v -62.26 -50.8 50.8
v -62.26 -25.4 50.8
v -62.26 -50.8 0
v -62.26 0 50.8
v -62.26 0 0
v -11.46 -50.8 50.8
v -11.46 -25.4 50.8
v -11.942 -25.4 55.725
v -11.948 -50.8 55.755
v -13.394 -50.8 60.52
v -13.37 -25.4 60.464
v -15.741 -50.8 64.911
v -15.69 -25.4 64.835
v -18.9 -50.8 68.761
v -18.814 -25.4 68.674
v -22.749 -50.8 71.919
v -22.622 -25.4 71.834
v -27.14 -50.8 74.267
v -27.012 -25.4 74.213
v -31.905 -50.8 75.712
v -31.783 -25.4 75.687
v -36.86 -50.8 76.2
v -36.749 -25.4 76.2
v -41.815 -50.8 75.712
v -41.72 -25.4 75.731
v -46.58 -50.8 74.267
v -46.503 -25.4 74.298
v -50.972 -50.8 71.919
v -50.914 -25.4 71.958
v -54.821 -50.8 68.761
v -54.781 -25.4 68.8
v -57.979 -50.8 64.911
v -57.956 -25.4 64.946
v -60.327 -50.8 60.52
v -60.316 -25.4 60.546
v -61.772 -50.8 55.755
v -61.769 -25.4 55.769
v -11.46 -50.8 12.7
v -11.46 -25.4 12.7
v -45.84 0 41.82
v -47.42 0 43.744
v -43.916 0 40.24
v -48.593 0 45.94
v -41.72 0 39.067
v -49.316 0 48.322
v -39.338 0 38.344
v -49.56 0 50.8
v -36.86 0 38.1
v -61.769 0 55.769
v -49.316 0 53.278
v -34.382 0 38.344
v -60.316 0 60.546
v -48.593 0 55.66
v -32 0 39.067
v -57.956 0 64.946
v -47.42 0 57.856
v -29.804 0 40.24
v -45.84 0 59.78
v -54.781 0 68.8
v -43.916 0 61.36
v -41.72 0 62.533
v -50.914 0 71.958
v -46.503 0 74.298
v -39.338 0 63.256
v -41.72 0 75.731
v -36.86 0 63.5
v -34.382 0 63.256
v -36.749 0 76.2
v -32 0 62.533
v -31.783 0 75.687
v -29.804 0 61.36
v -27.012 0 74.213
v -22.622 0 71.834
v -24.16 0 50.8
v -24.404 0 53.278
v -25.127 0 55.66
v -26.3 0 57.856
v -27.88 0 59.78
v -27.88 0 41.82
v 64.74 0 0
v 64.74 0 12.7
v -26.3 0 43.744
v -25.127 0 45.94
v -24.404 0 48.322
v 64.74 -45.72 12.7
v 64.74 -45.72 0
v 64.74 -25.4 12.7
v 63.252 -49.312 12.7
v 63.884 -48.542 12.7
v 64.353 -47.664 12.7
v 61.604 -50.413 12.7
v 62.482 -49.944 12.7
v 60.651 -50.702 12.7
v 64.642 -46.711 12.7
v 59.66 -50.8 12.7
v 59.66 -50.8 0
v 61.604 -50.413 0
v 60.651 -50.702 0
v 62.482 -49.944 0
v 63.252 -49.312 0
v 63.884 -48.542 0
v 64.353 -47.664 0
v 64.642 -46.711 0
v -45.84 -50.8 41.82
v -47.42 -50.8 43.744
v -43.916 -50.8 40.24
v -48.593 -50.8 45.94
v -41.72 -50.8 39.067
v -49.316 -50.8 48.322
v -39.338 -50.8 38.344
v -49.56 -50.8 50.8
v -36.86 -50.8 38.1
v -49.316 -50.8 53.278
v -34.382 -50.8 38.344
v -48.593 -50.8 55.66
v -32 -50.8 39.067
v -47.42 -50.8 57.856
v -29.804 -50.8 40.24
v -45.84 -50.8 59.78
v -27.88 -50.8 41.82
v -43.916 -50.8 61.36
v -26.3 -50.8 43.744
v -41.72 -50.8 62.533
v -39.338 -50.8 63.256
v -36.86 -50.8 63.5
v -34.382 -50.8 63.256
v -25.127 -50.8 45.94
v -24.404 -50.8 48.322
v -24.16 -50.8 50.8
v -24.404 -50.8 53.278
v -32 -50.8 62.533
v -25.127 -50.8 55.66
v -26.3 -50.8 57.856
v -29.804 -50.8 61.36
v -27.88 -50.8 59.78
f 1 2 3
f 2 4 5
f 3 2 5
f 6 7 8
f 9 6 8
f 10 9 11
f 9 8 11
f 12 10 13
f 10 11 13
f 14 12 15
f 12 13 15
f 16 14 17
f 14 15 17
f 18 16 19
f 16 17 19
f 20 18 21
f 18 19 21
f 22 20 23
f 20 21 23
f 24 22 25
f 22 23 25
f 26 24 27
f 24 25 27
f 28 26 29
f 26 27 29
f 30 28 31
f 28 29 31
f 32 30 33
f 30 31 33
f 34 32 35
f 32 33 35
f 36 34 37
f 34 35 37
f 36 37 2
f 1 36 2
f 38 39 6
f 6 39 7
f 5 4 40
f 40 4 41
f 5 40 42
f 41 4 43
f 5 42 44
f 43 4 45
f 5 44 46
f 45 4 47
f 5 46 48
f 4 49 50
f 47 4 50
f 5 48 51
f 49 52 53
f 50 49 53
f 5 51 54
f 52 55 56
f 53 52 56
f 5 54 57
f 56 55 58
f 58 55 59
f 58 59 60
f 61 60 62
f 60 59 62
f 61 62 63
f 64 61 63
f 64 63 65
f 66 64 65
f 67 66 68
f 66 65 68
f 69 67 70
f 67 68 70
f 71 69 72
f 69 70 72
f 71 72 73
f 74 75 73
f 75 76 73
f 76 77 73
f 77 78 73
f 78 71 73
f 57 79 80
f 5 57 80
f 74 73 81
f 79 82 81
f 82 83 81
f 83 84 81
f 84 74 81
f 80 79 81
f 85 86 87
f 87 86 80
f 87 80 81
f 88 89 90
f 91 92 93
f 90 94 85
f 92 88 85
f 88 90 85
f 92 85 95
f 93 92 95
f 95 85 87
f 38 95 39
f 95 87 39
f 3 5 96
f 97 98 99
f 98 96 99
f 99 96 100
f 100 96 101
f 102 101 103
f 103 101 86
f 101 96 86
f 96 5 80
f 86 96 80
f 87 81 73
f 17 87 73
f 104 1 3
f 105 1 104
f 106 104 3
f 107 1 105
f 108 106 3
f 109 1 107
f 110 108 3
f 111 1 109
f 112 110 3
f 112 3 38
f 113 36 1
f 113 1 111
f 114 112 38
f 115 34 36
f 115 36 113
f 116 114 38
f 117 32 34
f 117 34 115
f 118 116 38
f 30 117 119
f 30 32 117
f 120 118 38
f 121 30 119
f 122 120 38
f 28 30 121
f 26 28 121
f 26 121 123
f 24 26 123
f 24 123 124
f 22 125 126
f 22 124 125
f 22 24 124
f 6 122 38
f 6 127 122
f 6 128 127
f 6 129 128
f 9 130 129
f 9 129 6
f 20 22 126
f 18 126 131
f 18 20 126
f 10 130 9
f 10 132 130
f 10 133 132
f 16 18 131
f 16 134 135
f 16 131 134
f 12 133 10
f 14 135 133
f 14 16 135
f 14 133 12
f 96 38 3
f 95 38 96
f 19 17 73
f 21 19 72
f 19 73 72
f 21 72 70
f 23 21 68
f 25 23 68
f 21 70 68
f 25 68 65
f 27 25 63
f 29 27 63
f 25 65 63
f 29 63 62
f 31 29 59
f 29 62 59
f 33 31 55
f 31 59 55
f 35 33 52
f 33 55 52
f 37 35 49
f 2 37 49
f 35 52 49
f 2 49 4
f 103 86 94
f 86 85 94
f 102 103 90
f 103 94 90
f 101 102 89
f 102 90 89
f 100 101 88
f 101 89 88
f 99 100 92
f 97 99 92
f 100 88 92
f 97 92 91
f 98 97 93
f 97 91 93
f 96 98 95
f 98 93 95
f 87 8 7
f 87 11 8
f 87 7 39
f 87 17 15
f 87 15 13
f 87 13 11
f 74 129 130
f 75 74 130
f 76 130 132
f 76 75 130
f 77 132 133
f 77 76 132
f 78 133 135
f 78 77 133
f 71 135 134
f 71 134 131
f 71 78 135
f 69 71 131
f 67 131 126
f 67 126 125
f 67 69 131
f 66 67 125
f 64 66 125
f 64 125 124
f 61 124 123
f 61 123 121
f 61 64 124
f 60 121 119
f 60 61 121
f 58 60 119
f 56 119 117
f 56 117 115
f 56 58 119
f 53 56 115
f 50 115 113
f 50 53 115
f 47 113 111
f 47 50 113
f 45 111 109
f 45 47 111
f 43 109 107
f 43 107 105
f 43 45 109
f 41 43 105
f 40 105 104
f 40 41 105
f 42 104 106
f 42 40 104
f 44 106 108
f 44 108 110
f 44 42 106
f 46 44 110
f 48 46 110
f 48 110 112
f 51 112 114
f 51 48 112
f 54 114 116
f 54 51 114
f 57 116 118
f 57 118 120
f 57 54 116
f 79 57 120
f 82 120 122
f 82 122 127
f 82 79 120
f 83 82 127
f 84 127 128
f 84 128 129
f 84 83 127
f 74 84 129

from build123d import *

# Parameters (mm, degrees)
F0_R     = 12.7
F1_DEPTH = 25.4
F2_R     = 12.7
F3_DEPTH = 25.4
F4_DEPTH = 25.4
F5_R     = 5.08


with BuildPart() as f1:
    # F0 (on Front) → F1 (new body)
    with BuildSketch(Plane.XZ):
        with BuildLine():
            Line((64.7399425507, 12.7), (-22.6221843212, 71.8343283417))
            ThreePointArc((-22.6221843212, 71.8343283417), (-48.766316781, 73.2365993129), (-62.2600574493, 50.8))
            Line((-62.2600574493, 50.8), (-62.2600574493, 0))
            Line((-62.2600574493, 0), (64.7399425507, 0))
            Line((64.7399425507, 0), (64.7399425507, 12.7))
        make_face()
        with Locations((-36.8600574493, 50.8)):
            Circle(F0_R, mode=Mode.SUBTRACT)
    extrude(amount=F1_DEPTH)

    # F2 (on face) → F3 (join)
    with BuildSketch(Plane.XZ.offset(25.4)):
        with BuildLine():
            Line((64.7399425507, 0), (64.7399425507, 12.7))
            Line((64.7399425507, 12.7), (-11.4600574493, 12.7))
            Line((-11.4600574493, 12.7), (-11.4600574493, 50.8))
            ThreePointArc((-11.4600574493, 50.8), (-36.8600574493, 76.2), (-62.2600574493, 50.8))
            Line((-62.2600574493, 50.8), (-62.2600574493, 12.7))
            Line((-62.2600574493, 12.7), (-62.2600574493, 0))
            Line((-62.2600574493, 0), (64.7399425507, 0))
        make_face()
        with Locations((-36.8600574493, 50.8)):
            Circle(F2_R, mode=Mode.SUBTRACT)
    extrude(amount=F3_DEPTH)

    # F2 (on face) → F4 (join)
    with BuildSketch(Plane.XZ.offset(25.4)):
        with BuildLine():
            Line((64.7399425507, 0), (64.7399425507, 12.7))
            Line((64.7399425507, 12.7), (-11.4600574493, 12.7))
            Line((-11.4600574493, 12.7), (-11.4600574493, 50.8))
            ThreePointArc((-11.4600574493, 50.8), (-14.4234581364, 62.7062593317), (-22.6221843212, 71.8343283417))
            ThreePointArc((-22.6221843212, 71.8343283417), (-48.766316781, 73.2365993129), (-62.2600574493, 50.8))
            Line((-62.2600574493, 50.8), (-62.2600574493, 12.7))
            Line((-62.2600574493, 12.7), (-62.2600574493, 0))
            Line((-62.2600574493, 0), (64.7399425507, 0))
        make_face()
        with Locations((-36.8600574493, 50.8)):
            Circle(F2_R, mode=Mode.SUBTRACT)
    extrude(amount=F4_DEPTH)

    # F5
    f5_edges = [f1.edges().sort_by_distance(p)[0] for p in [
        (64.739943, -50.8, 6.35),
    ]]
    fillet(f5_edges, radius=F5_R)


solid = f1.part
